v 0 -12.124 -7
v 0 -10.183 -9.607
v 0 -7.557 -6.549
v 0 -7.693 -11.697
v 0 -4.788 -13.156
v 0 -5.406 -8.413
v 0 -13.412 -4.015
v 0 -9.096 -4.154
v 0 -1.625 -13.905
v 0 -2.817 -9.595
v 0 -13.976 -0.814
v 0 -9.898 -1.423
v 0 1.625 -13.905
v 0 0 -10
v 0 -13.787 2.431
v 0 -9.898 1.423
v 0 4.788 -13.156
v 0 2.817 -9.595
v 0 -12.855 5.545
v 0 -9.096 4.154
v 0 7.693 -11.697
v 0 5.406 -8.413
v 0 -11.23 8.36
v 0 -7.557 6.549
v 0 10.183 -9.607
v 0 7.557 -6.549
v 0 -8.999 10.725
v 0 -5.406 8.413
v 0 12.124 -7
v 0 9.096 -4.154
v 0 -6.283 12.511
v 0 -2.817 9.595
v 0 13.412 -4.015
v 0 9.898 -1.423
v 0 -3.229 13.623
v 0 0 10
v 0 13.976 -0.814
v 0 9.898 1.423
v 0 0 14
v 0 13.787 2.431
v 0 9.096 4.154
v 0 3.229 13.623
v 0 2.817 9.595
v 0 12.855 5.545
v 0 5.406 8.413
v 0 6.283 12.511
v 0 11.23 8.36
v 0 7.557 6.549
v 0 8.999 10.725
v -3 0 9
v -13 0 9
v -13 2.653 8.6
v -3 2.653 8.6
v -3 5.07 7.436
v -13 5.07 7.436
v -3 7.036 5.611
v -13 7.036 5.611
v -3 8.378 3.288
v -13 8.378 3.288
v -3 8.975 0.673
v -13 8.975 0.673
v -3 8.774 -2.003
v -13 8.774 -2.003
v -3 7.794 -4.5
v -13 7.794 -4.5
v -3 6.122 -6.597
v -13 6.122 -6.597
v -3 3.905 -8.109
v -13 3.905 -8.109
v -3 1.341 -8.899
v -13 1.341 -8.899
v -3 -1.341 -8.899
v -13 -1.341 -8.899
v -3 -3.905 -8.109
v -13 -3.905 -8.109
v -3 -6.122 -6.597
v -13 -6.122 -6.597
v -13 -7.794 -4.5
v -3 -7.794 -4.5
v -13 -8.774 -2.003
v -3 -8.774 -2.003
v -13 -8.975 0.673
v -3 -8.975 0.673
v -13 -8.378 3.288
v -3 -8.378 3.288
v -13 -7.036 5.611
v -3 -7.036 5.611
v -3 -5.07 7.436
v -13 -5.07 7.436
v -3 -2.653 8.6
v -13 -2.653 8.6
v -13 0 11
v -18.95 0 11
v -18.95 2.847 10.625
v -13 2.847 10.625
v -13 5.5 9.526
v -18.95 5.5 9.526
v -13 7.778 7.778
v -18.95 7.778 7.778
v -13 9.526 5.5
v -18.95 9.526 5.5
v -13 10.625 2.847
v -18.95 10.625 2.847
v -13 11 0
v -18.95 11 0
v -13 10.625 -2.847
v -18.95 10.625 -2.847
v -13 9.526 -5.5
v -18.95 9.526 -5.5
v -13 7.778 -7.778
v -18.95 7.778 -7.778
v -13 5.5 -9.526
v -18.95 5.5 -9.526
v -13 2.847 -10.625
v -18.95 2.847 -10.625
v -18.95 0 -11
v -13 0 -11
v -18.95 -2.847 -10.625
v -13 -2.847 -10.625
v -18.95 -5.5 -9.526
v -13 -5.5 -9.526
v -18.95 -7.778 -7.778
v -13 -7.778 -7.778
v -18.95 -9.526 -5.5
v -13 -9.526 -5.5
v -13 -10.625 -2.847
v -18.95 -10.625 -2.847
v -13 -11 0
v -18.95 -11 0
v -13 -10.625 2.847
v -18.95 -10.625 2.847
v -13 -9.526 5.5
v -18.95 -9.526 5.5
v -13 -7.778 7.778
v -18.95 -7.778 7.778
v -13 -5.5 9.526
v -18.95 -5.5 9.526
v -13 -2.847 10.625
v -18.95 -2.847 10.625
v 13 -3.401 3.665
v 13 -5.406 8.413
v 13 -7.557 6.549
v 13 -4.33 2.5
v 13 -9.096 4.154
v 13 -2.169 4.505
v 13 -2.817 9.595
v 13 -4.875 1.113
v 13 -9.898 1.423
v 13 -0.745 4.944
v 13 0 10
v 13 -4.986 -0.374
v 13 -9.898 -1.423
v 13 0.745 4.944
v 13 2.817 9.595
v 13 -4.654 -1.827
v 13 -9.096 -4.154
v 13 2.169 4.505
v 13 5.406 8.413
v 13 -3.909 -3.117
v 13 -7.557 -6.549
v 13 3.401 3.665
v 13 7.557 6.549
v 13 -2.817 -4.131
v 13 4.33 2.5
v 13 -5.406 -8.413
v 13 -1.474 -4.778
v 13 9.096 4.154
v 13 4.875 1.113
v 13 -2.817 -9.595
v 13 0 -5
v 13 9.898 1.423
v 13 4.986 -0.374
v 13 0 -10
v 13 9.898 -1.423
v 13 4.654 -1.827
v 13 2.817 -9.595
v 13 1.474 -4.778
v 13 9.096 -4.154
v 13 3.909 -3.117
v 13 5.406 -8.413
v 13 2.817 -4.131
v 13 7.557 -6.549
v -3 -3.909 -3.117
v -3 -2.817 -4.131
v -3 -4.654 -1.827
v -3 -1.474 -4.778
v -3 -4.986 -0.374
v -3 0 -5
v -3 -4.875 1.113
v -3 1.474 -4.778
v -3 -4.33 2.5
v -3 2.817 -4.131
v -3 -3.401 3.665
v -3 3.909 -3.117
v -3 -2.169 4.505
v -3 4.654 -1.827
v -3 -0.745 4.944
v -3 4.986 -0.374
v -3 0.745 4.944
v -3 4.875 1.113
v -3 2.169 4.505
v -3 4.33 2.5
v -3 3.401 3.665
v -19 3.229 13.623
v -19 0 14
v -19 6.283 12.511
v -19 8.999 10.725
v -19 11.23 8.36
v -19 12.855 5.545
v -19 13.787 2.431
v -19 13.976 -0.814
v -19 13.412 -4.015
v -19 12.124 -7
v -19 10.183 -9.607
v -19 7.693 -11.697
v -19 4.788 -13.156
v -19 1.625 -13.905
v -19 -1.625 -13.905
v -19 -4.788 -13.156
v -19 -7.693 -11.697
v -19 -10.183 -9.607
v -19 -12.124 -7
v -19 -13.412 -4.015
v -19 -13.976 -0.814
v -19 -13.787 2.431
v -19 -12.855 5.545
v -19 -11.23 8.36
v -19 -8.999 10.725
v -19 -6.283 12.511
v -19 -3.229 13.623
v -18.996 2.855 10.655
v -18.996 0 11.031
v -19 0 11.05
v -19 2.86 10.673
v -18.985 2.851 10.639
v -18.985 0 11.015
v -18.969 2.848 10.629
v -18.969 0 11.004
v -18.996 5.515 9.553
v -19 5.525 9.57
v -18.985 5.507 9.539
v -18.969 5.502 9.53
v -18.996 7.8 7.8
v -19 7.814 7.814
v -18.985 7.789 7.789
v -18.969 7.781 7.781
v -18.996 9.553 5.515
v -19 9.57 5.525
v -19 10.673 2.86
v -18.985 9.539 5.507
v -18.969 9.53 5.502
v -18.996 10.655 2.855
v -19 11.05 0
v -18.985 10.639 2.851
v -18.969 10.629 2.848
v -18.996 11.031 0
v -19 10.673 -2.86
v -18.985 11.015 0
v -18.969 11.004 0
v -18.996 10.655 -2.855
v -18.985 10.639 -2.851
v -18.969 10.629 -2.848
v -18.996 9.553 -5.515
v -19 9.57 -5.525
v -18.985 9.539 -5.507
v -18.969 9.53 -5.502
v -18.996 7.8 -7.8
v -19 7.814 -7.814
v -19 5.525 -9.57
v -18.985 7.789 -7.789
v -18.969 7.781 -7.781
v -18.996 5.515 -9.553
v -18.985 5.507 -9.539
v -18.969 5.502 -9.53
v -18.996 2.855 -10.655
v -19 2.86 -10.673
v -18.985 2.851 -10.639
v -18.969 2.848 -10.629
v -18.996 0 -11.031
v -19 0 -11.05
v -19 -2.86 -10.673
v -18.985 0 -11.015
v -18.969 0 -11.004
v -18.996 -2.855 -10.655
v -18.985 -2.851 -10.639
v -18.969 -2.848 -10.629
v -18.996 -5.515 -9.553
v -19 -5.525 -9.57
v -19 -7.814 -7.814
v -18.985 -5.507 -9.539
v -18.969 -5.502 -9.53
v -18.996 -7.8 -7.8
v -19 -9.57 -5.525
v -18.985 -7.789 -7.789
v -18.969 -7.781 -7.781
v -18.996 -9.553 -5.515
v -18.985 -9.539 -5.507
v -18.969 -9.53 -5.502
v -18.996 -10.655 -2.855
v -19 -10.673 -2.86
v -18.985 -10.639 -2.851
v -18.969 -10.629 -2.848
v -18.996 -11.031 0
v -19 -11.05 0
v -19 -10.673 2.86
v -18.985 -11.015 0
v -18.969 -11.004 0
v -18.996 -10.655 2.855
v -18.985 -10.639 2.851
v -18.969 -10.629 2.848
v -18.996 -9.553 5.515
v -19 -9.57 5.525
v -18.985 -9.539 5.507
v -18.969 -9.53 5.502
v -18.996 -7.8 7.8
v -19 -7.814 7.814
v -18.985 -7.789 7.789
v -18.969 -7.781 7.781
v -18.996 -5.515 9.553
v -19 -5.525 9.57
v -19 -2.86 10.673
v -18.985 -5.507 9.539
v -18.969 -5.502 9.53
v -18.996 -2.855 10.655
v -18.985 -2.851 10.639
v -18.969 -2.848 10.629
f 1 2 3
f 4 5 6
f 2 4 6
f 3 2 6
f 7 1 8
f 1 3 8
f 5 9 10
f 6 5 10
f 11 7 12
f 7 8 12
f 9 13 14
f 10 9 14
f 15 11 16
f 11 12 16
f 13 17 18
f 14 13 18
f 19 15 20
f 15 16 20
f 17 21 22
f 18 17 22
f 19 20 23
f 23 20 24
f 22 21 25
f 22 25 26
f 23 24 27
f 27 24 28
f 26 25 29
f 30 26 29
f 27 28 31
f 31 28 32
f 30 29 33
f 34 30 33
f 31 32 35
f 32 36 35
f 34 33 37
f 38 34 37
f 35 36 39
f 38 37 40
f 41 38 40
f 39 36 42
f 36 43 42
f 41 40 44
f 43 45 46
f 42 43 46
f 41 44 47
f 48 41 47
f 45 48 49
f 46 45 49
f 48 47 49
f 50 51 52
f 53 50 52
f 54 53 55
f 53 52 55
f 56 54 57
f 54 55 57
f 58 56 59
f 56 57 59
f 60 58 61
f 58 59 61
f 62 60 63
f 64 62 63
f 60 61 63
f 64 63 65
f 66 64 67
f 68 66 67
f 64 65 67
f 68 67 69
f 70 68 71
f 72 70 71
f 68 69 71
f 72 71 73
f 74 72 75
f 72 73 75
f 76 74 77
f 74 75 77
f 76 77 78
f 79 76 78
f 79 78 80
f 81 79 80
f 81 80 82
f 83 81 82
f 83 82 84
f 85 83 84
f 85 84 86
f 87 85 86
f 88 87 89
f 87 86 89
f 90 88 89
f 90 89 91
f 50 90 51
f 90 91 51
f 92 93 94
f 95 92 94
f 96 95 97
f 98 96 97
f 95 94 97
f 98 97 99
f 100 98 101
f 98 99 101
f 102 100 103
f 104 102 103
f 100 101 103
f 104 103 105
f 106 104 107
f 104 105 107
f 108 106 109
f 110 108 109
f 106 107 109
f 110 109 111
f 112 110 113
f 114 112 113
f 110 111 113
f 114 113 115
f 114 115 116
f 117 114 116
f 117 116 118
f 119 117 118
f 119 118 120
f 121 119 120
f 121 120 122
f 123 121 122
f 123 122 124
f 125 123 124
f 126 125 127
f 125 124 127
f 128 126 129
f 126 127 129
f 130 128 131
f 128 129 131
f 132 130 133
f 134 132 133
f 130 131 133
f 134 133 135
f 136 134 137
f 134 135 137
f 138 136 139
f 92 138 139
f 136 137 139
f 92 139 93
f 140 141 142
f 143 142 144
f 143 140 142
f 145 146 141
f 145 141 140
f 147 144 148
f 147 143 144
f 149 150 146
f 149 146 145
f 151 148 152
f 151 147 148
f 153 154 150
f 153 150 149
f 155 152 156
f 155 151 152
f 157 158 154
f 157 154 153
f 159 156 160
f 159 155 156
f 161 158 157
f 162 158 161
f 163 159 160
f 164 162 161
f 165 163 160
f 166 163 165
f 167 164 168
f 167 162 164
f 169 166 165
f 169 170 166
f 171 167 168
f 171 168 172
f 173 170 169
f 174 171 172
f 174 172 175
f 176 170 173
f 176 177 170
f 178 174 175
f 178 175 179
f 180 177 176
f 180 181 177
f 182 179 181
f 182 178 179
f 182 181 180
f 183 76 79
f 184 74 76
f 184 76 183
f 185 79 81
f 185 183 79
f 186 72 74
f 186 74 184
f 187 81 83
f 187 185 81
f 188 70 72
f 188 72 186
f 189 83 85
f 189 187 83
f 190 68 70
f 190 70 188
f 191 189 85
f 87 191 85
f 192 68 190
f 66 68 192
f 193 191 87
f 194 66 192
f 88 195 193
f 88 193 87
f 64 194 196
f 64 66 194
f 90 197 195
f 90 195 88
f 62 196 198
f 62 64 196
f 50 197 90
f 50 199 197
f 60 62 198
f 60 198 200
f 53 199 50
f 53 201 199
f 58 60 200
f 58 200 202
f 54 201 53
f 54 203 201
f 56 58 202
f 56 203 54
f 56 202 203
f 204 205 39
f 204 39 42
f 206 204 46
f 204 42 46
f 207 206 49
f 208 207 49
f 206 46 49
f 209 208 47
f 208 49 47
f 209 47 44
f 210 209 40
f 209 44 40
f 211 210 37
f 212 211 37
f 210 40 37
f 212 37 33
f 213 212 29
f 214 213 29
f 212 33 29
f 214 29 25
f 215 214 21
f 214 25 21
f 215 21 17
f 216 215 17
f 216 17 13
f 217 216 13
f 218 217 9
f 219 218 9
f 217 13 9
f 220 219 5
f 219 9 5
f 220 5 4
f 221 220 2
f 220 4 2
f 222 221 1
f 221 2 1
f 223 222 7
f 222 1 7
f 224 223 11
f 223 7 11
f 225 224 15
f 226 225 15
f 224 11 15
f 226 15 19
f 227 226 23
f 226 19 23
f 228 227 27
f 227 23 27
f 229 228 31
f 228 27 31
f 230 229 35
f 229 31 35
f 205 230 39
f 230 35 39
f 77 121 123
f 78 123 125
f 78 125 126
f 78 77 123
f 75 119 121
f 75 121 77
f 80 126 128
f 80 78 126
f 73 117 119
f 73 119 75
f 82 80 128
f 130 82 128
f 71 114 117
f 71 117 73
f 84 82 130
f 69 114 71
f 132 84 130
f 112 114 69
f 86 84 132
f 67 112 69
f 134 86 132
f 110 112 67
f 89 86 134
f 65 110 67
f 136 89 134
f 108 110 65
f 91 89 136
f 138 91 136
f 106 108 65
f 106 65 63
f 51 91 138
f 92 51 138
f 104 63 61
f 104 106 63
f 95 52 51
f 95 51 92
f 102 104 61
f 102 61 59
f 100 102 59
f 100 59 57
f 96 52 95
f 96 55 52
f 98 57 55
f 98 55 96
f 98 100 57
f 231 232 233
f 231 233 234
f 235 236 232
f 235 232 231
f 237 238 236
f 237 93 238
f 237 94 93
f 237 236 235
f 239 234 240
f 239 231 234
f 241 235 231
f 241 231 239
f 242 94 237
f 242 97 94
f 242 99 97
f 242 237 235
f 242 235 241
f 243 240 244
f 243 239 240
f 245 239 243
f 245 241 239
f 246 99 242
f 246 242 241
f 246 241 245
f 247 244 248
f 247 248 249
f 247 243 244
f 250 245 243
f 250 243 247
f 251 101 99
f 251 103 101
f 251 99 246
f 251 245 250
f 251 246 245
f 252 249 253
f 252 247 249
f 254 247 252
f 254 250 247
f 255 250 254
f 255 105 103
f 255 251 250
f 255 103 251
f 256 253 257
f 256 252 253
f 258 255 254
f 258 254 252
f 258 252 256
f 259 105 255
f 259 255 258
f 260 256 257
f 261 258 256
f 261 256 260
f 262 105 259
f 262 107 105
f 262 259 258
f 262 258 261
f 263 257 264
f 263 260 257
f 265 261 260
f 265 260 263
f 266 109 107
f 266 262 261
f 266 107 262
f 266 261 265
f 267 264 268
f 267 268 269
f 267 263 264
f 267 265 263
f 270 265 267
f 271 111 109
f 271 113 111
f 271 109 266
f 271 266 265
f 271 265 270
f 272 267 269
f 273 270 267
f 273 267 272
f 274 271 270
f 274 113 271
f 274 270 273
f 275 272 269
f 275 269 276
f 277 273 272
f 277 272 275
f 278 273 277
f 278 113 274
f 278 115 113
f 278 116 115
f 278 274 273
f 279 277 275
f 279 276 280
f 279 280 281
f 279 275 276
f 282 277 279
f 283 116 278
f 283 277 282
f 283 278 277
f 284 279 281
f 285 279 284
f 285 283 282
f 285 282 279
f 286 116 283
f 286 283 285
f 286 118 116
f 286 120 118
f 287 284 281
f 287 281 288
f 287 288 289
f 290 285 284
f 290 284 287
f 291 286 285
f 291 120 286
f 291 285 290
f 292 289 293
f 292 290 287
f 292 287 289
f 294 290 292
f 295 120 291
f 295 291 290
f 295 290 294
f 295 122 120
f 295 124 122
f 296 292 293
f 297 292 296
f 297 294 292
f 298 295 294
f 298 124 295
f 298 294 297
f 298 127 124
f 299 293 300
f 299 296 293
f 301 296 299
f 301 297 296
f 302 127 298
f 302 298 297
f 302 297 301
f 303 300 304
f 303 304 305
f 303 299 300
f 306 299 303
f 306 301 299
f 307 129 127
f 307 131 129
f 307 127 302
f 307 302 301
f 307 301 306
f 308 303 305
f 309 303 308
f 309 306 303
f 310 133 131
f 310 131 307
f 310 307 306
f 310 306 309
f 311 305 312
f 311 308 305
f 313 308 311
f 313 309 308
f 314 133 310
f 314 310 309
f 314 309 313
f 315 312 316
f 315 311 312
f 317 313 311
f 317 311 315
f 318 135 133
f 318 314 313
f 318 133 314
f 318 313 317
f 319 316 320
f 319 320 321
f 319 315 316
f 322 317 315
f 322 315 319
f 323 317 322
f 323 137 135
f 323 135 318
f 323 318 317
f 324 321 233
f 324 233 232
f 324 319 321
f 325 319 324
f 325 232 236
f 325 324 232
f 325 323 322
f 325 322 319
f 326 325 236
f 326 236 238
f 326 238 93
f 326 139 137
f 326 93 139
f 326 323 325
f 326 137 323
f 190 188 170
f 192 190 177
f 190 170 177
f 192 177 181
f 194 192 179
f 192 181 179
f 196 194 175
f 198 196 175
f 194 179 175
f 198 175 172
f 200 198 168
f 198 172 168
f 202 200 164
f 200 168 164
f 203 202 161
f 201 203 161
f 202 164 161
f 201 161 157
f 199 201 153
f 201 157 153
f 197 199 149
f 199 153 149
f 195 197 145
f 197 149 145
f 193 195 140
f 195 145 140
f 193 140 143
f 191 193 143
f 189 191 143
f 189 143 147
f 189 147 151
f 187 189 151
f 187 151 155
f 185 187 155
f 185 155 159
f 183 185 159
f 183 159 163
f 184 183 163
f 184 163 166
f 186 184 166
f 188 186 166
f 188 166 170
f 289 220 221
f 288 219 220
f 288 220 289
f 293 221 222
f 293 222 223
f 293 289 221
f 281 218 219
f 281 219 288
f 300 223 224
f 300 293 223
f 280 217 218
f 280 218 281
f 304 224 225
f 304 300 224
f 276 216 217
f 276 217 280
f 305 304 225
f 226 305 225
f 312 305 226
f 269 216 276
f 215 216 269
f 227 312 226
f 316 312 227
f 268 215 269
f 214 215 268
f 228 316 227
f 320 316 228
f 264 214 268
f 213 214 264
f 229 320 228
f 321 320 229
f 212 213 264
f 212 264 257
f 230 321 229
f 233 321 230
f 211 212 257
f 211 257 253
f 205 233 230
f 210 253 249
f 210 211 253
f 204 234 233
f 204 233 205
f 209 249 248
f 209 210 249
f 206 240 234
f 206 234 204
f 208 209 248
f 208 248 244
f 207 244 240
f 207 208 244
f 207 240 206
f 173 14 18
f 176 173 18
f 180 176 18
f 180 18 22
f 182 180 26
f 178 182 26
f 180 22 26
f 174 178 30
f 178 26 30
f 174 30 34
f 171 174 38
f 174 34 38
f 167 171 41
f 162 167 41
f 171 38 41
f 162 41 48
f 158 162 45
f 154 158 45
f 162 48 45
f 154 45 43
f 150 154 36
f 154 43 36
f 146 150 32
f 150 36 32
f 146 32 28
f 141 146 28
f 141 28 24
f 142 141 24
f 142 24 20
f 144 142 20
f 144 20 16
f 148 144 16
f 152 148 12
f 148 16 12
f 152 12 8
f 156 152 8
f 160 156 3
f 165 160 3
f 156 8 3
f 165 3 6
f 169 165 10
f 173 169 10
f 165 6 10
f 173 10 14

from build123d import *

# Parameters (mm, degrees)
SKETCH1_R           = 10
BOSS_EXTRUDE1_DEPTH = 13
SKETCH2_R           = 14
BOSS_EXTRUDE2_DEPTH = 19
SKETCH3_R           = 11
CUT_EXTRUDE1_DEPTH  = 6
SKETCH4_R           = 9
CUT_EXTRUDE2_DEPTH  = 10
SKETCH5_R           = 5
CUT_EXTRUDE3_DEPTH  = 33
FILLET1_R           = 0.05


with BuildPart() as part:
    # Sketch1 → Boss-Extrude1 (new body)
    with BuildSketch(Plane(origin=(0, 0, 0), x_dir=(0, 0, -1), z_dir=(1, 0, 0))):
        Circle(SKETCH1_R)
    extrude(amount=BOSS_EXTRUDE1_DEPTH)

    # Sketch2 → Boss-Extrude2 (add)
    with BuildSketch(Plane.ZY):
        Circle(SKETCH2_R)
    extrude(amount=BOSS_EXTRUDE2_DEPTH)

    # Sketch3 → Cut-Extrude1 (cut)
    with BuildSketch(Plane.ZY.offset(19)):
        Circle(SKETCH3_R)
    extrude(amount=-CUT_EXTRUDE1_DEPTH, mode=Mode.SUBTRACT)

    # Sketch4 → Cut-Extrude2 (cut)
    with BuildSketch(Plane.ZY.offset(13)):
        Circle(SKETCH4_R)
    extrude(amount=-CUT_EXTRUDE2_DEPTH, mode=Mode.SUBTRACT)

    # Sketch5 → Cut-Extrude3 (cut, through all)
    with BuildSketch(Plane(origin=(13, 0, 0), x_dir=(0, 0, -1), z_dir=(1, 0, 0))):
        Circle(SKETCH5_R)
    extrude(amount=-CUT_EXTRUDE3_DEPTH, mode=Mode.SUBTRACT)

    # Fillet1
    fillet1_edges = [part.edges().sort_by_distance(p)[0] for p in [
        (-19, 0, -11),
    ]]
    fillet(fillet1_edges, radius=FILLET1_R)


solid = part.part
